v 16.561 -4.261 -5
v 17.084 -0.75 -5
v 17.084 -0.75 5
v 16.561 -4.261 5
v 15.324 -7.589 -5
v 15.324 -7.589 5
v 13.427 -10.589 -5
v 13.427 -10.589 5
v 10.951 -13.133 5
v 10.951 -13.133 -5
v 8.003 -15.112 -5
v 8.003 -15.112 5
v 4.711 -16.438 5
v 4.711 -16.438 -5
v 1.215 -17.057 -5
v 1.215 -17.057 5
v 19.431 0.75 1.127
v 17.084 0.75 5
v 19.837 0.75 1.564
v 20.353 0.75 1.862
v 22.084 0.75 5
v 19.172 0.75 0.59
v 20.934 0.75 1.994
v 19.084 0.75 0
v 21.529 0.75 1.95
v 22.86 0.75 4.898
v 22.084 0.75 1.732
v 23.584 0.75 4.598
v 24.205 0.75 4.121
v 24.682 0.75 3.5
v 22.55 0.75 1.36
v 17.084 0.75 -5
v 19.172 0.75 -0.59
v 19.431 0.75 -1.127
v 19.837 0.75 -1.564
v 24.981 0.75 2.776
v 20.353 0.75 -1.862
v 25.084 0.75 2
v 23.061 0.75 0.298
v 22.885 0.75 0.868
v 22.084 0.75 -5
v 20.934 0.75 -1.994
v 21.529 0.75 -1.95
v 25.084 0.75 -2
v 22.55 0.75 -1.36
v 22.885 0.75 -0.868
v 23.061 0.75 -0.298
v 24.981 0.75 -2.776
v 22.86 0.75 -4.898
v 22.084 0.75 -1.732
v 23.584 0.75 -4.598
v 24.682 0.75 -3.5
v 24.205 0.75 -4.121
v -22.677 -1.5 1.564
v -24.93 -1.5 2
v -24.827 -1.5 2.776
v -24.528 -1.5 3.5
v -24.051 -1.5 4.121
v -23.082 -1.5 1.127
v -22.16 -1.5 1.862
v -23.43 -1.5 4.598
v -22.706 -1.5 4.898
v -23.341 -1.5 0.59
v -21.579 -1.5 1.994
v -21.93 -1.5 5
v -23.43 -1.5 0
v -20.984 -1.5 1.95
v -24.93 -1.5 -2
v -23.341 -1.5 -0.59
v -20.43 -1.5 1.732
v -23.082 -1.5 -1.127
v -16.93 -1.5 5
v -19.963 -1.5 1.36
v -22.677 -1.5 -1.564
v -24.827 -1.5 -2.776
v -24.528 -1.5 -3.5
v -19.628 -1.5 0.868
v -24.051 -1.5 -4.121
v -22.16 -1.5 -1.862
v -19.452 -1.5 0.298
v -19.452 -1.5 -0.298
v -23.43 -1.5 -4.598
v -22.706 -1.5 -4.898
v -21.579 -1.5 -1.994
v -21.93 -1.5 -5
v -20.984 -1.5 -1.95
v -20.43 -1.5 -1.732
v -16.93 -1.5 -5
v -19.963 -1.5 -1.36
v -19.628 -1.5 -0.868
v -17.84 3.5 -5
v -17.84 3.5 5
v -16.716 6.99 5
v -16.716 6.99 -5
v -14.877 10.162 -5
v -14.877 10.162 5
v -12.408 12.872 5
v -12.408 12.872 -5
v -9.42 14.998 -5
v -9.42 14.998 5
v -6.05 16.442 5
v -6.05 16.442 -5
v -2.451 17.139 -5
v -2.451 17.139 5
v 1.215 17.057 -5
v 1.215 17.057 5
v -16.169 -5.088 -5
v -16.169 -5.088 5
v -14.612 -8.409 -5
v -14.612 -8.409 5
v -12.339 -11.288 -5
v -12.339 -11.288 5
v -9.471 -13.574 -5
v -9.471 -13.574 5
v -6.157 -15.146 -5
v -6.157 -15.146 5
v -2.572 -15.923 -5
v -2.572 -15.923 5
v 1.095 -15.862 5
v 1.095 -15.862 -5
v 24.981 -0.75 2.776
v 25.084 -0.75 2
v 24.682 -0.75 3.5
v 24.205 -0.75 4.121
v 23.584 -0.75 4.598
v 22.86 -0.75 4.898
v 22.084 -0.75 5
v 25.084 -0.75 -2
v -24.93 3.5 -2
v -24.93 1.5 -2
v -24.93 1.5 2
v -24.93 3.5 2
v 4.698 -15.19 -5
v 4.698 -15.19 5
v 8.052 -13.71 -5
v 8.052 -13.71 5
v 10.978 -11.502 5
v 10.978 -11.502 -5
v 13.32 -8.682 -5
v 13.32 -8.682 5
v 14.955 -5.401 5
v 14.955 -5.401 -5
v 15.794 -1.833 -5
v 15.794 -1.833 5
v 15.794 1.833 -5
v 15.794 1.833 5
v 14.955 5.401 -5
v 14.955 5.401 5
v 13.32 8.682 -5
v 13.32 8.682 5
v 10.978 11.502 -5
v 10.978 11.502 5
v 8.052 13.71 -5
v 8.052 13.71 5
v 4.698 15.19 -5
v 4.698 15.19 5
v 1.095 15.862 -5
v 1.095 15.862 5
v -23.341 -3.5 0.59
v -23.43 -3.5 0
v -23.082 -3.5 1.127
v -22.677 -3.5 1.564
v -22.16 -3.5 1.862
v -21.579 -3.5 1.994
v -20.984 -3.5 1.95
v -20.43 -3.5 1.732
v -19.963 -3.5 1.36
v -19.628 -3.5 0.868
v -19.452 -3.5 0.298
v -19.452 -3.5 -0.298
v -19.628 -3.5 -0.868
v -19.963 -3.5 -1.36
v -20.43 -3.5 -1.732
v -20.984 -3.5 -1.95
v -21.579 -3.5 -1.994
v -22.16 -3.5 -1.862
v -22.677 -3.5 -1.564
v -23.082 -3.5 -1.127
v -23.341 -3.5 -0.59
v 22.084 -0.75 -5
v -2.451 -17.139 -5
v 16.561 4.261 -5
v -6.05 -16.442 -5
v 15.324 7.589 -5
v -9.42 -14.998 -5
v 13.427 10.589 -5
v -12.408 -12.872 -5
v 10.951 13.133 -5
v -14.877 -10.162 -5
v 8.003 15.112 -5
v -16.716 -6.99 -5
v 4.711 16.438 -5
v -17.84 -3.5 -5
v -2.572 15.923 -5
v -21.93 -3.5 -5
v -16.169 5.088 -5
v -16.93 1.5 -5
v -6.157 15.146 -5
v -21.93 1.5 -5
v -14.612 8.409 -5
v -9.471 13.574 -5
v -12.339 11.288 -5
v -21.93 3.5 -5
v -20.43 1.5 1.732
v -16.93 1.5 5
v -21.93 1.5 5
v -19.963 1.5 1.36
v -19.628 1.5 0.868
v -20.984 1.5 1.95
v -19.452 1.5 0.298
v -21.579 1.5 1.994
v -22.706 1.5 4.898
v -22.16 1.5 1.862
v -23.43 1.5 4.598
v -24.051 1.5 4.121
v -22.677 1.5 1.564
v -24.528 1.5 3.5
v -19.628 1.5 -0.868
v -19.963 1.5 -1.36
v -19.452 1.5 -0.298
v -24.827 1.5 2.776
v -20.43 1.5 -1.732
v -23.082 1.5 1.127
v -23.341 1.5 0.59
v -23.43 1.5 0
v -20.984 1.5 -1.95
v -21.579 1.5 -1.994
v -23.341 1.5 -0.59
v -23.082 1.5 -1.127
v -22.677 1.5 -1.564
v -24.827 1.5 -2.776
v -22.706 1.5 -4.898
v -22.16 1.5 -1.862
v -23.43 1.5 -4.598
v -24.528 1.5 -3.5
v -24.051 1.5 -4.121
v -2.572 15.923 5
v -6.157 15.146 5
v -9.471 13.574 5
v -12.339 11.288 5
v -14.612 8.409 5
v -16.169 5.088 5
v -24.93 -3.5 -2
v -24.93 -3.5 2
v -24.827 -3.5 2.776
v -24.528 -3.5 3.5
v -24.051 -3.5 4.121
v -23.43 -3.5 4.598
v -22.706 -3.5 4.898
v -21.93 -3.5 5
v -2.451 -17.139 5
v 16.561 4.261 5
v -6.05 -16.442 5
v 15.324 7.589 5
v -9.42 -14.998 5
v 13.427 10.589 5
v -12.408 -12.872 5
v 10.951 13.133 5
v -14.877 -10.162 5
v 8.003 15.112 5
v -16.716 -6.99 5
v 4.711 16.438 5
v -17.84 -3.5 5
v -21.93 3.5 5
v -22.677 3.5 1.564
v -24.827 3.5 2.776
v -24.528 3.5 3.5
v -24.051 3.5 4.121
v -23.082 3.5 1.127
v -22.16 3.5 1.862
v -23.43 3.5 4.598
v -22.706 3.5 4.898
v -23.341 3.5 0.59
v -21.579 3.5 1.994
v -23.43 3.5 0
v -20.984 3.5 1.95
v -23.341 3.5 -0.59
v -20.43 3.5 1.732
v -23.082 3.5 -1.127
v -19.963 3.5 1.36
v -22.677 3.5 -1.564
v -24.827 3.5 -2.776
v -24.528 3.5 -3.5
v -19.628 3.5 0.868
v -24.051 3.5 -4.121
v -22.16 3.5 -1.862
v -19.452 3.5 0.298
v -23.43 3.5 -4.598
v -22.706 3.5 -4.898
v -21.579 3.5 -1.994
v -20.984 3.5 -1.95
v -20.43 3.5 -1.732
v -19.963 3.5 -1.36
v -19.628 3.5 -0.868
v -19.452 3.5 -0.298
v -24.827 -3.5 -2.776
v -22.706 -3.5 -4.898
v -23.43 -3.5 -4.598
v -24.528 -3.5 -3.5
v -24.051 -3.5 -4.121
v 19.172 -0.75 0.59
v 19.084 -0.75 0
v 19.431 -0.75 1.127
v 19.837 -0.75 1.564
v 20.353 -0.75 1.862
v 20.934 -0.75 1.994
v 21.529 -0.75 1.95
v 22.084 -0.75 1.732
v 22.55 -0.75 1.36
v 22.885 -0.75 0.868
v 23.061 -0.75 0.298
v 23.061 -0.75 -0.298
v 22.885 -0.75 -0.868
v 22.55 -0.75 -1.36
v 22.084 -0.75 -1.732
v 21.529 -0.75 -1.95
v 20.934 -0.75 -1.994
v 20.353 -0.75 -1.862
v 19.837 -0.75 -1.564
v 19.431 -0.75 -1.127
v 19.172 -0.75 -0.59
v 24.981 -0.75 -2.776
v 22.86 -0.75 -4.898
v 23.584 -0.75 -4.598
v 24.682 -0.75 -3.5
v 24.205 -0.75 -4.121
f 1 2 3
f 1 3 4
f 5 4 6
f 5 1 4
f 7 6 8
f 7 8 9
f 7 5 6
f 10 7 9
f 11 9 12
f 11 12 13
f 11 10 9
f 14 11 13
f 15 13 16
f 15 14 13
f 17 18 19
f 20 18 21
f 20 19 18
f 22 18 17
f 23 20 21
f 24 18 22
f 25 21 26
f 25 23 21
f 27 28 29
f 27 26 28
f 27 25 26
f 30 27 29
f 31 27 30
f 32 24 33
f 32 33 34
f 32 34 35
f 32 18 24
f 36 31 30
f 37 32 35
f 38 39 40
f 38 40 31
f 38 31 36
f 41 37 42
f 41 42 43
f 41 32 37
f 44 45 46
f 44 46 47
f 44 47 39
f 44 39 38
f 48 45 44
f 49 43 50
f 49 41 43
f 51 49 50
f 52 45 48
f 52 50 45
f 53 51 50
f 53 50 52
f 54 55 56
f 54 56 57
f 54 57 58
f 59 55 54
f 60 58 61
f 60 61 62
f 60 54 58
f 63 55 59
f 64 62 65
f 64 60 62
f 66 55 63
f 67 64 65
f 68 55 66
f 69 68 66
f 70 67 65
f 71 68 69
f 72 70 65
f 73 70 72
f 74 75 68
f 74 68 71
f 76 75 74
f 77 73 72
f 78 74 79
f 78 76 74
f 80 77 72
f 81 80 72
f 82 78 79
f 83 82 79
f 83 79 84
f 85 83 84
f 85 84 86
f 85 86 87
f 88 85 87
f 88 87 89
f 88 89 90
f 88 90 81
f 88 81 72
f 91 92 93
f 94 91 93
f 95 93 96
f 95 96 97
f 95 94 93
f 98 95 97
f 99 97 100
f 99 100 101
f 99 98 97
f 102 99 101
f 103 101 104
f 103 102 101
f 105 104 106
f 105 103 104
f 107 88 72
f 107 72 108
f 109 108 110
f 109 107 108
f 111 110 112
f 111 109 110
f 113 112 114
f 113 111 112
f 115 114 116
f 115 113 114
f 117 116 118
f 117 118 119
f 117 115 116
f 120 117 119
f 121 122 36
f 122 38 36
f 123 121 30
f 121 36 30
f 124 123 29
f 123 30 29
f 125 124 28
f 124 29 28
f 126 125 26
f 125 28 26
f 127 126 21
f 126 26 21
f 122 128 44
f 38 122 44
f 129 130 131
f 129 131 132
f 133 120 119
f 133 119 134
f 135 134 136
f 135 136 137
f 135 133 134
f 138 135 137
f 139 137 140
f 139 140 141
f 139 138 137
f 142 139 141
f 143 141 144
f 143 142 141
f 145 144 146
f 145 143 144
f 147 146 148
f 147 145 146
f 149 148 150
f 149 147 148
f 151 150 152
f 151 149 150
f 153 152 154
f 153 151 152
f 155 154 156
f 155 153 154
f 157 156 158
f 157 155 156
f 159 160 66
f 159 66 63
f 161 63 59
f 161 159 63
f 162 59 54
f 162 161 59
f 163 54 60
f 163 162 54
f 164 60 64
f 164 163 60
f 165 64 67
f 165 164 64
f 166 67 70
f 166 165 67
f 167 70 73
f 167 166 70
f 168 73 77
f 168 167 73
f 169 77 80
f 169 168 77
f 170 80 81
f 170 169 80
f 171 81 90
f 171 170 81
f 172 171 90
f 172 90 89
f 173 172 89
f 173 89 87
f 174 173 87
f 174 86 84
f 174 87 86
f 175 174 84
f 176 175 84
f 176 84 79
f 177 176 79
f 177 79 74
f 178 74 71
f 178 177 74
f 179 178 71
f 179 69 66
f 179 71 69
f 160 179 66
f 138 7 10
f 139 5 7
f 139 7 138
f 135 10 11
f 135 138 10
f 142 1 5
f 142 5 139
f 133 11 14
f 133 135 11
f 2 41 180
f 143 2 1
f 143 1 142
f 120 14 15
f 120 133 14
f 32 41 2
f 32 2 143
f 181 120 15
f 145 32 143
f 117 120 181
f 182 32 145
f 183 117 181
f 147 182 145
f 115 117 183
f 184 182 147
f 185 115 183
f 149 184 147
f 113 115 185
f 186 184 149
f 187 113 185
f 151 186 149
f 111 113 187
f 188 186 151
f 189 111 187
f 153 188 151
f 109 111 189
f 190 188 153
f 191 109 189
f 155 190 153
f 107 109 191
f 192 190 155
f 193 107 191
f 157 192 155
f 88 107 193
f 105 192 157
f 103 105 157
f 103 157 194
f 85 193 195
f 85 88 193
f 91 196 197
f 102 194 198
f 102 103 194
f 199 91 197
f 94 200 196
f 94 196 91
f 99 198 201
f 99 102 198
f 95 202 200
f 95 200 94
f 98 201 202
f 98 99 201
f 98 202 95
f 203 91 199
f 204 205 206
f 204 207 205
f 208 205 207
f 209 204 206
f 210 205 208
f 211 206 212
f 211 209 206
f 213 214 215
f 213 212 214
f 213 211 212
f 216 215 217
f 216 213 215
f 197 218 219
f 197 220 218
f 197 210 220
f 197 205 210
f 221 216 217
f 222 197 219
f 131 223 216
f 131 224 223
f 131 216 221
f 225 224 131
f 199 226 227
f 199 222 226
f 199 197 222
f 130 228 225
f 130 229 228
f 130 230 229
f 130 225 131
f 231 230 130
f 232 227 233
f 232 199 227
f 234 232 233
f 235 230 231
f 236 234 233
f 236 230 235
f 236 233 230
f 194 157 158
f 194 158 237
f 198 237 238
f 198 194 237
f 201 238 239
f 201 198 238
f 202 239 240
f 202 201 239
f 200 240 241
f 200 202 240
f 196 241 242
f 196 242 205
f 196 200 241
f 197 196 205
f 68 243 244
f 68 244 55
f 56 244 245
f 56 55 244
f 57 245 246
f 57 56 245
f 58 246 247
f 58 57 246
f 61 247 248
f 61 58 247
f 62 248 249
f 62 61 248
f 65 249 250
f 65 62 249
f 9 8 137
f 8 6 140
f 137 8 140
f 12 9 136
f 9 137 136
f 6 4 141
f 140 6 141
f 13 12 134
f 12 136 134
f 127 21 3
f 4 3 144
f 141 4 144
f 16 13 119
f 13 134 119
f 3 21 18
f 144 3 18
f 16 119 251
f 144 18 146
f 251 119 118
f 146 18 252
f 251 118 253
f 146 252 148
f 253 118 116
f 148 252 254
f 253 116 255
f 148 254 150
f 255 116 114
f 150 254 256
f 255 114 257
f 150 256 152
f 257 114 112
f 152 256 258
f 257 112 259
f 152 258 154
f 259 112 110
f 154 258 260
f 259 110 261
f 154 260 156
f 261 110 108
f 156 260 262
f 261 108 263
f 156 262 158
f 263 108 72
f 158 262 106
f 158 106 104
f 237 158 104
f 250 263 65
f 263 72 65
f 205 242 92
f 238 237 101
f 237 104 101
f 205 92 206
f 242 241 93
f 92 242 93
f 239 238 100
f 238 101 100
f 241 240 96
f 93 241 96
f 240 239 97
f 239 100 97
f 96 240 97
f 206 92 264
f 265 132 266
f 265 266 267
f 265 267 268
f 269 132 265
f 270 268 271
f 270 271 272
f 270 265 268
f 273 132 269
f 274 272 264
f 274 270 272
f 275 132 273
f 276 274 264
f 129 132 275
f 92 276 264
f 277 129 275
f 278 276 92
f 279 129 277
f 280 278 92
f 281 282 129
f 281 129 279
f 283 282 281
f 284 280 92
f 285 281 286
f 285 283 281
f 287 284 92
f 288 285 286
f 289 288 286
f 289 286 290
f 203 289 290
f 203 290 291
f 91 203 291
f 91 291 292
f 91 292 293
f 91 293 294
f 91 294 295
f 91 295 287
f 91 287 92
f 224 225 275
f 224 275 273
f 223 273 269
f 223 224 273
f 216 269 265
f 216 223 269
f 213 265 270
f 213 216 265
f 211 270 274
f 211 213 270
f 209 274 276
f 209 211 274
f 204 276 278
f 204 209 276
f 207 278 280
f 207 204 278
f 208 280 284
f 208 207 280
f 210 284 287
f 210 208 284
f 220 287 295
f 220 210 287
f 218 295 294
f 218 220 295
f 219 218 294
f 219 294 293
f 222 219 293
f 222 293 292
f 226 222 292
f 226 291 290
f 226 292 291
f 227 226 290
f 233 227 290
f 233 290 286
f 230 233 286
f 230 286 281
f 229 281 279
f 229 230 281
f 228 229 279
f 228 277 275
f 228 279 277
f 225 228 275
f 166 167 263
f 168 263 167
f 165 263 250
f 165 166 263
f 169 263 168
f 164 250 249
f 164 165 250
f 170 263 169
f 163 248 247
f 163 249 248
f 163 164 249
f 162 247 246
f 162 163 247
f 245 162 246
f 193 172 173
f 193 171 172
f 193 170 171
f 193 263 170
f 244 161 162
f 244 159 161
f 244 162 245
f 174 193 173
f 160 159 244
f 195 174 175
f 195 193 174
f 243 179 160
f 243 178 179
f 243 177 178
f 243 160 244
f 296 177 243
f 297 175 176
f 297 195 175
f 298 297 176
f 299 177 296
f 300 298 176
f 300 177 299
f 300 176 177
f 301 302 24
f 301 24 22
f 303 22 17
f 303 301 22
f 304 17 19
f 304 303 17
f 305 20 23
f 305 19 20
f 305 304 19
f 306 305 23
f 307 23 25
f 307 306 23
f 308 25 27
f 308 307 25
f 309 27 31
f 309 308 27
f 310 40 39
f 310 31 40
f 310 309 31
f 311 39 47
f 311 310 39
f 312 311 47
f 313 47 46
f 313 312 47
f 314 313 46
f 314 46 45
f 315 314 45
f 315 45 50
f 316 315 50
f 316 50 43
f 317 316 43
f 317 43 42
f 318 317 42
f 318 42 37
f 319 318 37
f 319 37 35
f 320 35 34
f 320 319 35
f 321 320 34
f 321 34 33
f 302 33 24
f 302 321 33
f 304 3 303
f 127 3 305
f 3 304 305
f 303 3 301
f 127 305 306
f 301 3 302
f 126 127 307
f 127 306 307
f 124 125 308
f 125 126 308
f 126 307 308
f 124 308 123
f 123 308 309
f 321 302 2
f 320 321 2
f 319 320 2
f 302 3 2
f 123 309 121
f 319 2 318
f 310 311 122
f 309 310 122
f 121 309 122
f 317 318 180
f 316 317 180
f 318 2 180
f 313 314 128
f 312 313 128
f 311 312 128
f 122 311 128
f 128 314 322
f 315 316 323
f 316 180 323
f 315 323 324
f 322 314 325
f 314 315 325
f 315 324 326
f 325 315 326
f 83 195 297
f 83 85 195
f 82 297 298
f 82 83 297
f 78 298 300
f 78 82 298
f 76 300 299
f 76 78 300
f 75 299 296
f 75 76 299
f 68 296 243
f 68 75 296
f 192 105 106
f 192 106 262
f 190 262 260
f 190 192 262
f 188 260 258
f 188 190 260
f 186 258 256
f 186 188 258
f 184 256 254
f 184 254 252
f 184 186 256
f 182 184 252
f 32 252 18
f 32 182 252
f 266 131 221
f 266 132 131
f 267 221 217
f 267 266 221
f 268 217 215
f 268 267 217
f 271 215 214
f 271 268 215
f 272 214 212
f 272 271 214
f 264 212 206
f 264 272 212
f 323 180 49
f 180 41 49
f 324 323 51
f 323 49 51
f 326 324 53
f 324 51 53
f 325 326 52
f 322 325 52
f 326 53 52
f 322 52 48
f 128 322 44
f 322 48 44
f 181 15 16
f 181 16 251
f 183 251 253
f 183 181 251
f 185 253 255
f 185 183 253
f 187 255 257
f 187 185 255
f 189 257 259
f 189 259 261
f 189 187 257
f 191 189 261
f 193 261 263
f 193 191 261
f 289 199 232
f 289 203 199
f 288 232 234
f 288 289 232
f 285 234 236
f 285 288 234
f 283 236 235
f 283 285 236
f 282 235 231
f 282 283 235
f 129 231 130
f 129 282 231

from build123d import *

# Parameters (mm, degrees)
BOSS_EXTRUDE2_DEPTH      = 5
BOSS_EXTRUDE2_DEPTH_BACK = 5
CUT_EXTRUDE1_DEPTH       = 33.786759245
CUT_EXTRUDE1_DEPTH_BACK  = 33.786759245
SKETCH2_R                = 2
BOSS_EXTRUDE3_DEPTH      = 5
BOSS_EXTRUDE3_DEPTH_BACK = 5
SKETCH3_W                = 8
SKETCH3_H                = 1.5
CUT_EXTRUDE2_DEPTH       = 32.24718732
CUT_EXTRUDE2_DEPTH_BACK  = 32.24718732
SKETCH4_R                = 2
FILLET1_R                = 3


with BuildPart() as part:
    # Sketch1 → Boss-Extrude2 (new, two sides: drawn at the far end of the back side and taken through both)
    with BuildSketch(Plane.XY.offset(-BOSS_EXTRUDE2_DEPTH_BACK)):
        with BuildLine():
            Line((-16.929532322, 1.5), (-24.929532322, 1.5))
            Line((-24.929532322, 1.5), (-24.929532322, 3.5))
            Line((-24.929532322, 3.5), (-17.840130641, 3.5))
            ThreePointArc((-17.840130641, 3.5), (-10.970967291, 14.01498524), (1.215, 17.05678091))
            ThreePointArc((1.215, 17.05678091), (17.1, 0), (1.215, -17.05678091))
            ThreePointArc((1.215, -17.05678091), (-10.970967291, -14.01498524), (-17.840130641, -3.5))
            Line((-17.840130641, -3.5), (-24.929532322, -3.5))
            Line((-24.929532322, -3.5), (-24.929532322, -1.5))
            Line((-24.929532322, -1.5), (-16.929532322, -1.5))
            ThreePointArc((-16.929532322, -1.5), (-10.970813778, -12.51330782), (1.095, -15.862249998))
            ThreePointArc((1.095, -15.862249998), (15.9, 0), (1.095, 15.862249998))
            ThreePointArc((1.095, 15.862249998), (-10.970813778, 12.51330782), (-16.929532322, 1.5))
        make_face()
    extrude(amount=BOSS_EXTRUDE2_DEPTH + BOSS_EXTRUDE2_DEPTH_BACK)

    # Sketch2 → Cut-Extrude1 (cut, two sides: drawn at the far end of the back side and taken through both)
    with BuildSketch(Plane(origin=(0, 3.5, 0), x_dir=(1, 0, 0), z_dir=(0, 1, 0)).offset(-CUT_EXTRUDE1_DEPTH_BACK)):
        with Locations((-21.429532322, 0)):
            Circle(SKETCH2_R)
    extrude(amount=CUT_EXTRUDE1_DEPTH + CUT_EXTRUDE1_DEPTH_BACK, mode=Mode.SUBTRACT)

    # Sketch3 → Boss-Extrude3 (add, two sides: drawn at the far end of the back side and taken through both)
    with BuildSketch(Plane.XY.offset(-BOSS_EXTRUDE3_DEPTH_BACK)):
        with Locations((21.083544714, 0)):
            Rectangle(SKETCH3_W, SKETCH3_H)
    extrude(amount=BOSS_EXTRUDE3_DEPTH + BOSS_EXTRUDE3_DEPTH_BACK)

    # Sketch4 → Cut-Extrude2 (cut, two sides: drawn at the far end of the back side and taken through both)
    with BuildSketch(Plane(origin=(0, 0.75, 0), x_dir=(1, 0, 0), z_dir=(0, 1, 0)).offset(-CUT_EXTRUDE2_DEPTH_BACK)):
        with Locations((21.083544714, 0)):
            Circle(SKETCH4_R)
    extrude(amount=CUT_EXTRUDE2_DEPTH + CUT_EXTRUDE2_DEPTH_BACK, mode=Mode.SUBTRACT)

    # Fillet1
    fillet1_edges = [part.edges().sort_by_distance(p)[0] for p in [
        (-24.929532322, -2.5, -5),
        (-24.929532322, 2.5, -5),
        (-24.929532322, -2.5, 5),
        (-24.929532322, 2.5, 5),
        (25.083544714, 0, 5),
        (25.083544714, 0, -5),
    ]]
    fillet(fillet1_edges, radius=FILLET1_R)


solid = part.part
